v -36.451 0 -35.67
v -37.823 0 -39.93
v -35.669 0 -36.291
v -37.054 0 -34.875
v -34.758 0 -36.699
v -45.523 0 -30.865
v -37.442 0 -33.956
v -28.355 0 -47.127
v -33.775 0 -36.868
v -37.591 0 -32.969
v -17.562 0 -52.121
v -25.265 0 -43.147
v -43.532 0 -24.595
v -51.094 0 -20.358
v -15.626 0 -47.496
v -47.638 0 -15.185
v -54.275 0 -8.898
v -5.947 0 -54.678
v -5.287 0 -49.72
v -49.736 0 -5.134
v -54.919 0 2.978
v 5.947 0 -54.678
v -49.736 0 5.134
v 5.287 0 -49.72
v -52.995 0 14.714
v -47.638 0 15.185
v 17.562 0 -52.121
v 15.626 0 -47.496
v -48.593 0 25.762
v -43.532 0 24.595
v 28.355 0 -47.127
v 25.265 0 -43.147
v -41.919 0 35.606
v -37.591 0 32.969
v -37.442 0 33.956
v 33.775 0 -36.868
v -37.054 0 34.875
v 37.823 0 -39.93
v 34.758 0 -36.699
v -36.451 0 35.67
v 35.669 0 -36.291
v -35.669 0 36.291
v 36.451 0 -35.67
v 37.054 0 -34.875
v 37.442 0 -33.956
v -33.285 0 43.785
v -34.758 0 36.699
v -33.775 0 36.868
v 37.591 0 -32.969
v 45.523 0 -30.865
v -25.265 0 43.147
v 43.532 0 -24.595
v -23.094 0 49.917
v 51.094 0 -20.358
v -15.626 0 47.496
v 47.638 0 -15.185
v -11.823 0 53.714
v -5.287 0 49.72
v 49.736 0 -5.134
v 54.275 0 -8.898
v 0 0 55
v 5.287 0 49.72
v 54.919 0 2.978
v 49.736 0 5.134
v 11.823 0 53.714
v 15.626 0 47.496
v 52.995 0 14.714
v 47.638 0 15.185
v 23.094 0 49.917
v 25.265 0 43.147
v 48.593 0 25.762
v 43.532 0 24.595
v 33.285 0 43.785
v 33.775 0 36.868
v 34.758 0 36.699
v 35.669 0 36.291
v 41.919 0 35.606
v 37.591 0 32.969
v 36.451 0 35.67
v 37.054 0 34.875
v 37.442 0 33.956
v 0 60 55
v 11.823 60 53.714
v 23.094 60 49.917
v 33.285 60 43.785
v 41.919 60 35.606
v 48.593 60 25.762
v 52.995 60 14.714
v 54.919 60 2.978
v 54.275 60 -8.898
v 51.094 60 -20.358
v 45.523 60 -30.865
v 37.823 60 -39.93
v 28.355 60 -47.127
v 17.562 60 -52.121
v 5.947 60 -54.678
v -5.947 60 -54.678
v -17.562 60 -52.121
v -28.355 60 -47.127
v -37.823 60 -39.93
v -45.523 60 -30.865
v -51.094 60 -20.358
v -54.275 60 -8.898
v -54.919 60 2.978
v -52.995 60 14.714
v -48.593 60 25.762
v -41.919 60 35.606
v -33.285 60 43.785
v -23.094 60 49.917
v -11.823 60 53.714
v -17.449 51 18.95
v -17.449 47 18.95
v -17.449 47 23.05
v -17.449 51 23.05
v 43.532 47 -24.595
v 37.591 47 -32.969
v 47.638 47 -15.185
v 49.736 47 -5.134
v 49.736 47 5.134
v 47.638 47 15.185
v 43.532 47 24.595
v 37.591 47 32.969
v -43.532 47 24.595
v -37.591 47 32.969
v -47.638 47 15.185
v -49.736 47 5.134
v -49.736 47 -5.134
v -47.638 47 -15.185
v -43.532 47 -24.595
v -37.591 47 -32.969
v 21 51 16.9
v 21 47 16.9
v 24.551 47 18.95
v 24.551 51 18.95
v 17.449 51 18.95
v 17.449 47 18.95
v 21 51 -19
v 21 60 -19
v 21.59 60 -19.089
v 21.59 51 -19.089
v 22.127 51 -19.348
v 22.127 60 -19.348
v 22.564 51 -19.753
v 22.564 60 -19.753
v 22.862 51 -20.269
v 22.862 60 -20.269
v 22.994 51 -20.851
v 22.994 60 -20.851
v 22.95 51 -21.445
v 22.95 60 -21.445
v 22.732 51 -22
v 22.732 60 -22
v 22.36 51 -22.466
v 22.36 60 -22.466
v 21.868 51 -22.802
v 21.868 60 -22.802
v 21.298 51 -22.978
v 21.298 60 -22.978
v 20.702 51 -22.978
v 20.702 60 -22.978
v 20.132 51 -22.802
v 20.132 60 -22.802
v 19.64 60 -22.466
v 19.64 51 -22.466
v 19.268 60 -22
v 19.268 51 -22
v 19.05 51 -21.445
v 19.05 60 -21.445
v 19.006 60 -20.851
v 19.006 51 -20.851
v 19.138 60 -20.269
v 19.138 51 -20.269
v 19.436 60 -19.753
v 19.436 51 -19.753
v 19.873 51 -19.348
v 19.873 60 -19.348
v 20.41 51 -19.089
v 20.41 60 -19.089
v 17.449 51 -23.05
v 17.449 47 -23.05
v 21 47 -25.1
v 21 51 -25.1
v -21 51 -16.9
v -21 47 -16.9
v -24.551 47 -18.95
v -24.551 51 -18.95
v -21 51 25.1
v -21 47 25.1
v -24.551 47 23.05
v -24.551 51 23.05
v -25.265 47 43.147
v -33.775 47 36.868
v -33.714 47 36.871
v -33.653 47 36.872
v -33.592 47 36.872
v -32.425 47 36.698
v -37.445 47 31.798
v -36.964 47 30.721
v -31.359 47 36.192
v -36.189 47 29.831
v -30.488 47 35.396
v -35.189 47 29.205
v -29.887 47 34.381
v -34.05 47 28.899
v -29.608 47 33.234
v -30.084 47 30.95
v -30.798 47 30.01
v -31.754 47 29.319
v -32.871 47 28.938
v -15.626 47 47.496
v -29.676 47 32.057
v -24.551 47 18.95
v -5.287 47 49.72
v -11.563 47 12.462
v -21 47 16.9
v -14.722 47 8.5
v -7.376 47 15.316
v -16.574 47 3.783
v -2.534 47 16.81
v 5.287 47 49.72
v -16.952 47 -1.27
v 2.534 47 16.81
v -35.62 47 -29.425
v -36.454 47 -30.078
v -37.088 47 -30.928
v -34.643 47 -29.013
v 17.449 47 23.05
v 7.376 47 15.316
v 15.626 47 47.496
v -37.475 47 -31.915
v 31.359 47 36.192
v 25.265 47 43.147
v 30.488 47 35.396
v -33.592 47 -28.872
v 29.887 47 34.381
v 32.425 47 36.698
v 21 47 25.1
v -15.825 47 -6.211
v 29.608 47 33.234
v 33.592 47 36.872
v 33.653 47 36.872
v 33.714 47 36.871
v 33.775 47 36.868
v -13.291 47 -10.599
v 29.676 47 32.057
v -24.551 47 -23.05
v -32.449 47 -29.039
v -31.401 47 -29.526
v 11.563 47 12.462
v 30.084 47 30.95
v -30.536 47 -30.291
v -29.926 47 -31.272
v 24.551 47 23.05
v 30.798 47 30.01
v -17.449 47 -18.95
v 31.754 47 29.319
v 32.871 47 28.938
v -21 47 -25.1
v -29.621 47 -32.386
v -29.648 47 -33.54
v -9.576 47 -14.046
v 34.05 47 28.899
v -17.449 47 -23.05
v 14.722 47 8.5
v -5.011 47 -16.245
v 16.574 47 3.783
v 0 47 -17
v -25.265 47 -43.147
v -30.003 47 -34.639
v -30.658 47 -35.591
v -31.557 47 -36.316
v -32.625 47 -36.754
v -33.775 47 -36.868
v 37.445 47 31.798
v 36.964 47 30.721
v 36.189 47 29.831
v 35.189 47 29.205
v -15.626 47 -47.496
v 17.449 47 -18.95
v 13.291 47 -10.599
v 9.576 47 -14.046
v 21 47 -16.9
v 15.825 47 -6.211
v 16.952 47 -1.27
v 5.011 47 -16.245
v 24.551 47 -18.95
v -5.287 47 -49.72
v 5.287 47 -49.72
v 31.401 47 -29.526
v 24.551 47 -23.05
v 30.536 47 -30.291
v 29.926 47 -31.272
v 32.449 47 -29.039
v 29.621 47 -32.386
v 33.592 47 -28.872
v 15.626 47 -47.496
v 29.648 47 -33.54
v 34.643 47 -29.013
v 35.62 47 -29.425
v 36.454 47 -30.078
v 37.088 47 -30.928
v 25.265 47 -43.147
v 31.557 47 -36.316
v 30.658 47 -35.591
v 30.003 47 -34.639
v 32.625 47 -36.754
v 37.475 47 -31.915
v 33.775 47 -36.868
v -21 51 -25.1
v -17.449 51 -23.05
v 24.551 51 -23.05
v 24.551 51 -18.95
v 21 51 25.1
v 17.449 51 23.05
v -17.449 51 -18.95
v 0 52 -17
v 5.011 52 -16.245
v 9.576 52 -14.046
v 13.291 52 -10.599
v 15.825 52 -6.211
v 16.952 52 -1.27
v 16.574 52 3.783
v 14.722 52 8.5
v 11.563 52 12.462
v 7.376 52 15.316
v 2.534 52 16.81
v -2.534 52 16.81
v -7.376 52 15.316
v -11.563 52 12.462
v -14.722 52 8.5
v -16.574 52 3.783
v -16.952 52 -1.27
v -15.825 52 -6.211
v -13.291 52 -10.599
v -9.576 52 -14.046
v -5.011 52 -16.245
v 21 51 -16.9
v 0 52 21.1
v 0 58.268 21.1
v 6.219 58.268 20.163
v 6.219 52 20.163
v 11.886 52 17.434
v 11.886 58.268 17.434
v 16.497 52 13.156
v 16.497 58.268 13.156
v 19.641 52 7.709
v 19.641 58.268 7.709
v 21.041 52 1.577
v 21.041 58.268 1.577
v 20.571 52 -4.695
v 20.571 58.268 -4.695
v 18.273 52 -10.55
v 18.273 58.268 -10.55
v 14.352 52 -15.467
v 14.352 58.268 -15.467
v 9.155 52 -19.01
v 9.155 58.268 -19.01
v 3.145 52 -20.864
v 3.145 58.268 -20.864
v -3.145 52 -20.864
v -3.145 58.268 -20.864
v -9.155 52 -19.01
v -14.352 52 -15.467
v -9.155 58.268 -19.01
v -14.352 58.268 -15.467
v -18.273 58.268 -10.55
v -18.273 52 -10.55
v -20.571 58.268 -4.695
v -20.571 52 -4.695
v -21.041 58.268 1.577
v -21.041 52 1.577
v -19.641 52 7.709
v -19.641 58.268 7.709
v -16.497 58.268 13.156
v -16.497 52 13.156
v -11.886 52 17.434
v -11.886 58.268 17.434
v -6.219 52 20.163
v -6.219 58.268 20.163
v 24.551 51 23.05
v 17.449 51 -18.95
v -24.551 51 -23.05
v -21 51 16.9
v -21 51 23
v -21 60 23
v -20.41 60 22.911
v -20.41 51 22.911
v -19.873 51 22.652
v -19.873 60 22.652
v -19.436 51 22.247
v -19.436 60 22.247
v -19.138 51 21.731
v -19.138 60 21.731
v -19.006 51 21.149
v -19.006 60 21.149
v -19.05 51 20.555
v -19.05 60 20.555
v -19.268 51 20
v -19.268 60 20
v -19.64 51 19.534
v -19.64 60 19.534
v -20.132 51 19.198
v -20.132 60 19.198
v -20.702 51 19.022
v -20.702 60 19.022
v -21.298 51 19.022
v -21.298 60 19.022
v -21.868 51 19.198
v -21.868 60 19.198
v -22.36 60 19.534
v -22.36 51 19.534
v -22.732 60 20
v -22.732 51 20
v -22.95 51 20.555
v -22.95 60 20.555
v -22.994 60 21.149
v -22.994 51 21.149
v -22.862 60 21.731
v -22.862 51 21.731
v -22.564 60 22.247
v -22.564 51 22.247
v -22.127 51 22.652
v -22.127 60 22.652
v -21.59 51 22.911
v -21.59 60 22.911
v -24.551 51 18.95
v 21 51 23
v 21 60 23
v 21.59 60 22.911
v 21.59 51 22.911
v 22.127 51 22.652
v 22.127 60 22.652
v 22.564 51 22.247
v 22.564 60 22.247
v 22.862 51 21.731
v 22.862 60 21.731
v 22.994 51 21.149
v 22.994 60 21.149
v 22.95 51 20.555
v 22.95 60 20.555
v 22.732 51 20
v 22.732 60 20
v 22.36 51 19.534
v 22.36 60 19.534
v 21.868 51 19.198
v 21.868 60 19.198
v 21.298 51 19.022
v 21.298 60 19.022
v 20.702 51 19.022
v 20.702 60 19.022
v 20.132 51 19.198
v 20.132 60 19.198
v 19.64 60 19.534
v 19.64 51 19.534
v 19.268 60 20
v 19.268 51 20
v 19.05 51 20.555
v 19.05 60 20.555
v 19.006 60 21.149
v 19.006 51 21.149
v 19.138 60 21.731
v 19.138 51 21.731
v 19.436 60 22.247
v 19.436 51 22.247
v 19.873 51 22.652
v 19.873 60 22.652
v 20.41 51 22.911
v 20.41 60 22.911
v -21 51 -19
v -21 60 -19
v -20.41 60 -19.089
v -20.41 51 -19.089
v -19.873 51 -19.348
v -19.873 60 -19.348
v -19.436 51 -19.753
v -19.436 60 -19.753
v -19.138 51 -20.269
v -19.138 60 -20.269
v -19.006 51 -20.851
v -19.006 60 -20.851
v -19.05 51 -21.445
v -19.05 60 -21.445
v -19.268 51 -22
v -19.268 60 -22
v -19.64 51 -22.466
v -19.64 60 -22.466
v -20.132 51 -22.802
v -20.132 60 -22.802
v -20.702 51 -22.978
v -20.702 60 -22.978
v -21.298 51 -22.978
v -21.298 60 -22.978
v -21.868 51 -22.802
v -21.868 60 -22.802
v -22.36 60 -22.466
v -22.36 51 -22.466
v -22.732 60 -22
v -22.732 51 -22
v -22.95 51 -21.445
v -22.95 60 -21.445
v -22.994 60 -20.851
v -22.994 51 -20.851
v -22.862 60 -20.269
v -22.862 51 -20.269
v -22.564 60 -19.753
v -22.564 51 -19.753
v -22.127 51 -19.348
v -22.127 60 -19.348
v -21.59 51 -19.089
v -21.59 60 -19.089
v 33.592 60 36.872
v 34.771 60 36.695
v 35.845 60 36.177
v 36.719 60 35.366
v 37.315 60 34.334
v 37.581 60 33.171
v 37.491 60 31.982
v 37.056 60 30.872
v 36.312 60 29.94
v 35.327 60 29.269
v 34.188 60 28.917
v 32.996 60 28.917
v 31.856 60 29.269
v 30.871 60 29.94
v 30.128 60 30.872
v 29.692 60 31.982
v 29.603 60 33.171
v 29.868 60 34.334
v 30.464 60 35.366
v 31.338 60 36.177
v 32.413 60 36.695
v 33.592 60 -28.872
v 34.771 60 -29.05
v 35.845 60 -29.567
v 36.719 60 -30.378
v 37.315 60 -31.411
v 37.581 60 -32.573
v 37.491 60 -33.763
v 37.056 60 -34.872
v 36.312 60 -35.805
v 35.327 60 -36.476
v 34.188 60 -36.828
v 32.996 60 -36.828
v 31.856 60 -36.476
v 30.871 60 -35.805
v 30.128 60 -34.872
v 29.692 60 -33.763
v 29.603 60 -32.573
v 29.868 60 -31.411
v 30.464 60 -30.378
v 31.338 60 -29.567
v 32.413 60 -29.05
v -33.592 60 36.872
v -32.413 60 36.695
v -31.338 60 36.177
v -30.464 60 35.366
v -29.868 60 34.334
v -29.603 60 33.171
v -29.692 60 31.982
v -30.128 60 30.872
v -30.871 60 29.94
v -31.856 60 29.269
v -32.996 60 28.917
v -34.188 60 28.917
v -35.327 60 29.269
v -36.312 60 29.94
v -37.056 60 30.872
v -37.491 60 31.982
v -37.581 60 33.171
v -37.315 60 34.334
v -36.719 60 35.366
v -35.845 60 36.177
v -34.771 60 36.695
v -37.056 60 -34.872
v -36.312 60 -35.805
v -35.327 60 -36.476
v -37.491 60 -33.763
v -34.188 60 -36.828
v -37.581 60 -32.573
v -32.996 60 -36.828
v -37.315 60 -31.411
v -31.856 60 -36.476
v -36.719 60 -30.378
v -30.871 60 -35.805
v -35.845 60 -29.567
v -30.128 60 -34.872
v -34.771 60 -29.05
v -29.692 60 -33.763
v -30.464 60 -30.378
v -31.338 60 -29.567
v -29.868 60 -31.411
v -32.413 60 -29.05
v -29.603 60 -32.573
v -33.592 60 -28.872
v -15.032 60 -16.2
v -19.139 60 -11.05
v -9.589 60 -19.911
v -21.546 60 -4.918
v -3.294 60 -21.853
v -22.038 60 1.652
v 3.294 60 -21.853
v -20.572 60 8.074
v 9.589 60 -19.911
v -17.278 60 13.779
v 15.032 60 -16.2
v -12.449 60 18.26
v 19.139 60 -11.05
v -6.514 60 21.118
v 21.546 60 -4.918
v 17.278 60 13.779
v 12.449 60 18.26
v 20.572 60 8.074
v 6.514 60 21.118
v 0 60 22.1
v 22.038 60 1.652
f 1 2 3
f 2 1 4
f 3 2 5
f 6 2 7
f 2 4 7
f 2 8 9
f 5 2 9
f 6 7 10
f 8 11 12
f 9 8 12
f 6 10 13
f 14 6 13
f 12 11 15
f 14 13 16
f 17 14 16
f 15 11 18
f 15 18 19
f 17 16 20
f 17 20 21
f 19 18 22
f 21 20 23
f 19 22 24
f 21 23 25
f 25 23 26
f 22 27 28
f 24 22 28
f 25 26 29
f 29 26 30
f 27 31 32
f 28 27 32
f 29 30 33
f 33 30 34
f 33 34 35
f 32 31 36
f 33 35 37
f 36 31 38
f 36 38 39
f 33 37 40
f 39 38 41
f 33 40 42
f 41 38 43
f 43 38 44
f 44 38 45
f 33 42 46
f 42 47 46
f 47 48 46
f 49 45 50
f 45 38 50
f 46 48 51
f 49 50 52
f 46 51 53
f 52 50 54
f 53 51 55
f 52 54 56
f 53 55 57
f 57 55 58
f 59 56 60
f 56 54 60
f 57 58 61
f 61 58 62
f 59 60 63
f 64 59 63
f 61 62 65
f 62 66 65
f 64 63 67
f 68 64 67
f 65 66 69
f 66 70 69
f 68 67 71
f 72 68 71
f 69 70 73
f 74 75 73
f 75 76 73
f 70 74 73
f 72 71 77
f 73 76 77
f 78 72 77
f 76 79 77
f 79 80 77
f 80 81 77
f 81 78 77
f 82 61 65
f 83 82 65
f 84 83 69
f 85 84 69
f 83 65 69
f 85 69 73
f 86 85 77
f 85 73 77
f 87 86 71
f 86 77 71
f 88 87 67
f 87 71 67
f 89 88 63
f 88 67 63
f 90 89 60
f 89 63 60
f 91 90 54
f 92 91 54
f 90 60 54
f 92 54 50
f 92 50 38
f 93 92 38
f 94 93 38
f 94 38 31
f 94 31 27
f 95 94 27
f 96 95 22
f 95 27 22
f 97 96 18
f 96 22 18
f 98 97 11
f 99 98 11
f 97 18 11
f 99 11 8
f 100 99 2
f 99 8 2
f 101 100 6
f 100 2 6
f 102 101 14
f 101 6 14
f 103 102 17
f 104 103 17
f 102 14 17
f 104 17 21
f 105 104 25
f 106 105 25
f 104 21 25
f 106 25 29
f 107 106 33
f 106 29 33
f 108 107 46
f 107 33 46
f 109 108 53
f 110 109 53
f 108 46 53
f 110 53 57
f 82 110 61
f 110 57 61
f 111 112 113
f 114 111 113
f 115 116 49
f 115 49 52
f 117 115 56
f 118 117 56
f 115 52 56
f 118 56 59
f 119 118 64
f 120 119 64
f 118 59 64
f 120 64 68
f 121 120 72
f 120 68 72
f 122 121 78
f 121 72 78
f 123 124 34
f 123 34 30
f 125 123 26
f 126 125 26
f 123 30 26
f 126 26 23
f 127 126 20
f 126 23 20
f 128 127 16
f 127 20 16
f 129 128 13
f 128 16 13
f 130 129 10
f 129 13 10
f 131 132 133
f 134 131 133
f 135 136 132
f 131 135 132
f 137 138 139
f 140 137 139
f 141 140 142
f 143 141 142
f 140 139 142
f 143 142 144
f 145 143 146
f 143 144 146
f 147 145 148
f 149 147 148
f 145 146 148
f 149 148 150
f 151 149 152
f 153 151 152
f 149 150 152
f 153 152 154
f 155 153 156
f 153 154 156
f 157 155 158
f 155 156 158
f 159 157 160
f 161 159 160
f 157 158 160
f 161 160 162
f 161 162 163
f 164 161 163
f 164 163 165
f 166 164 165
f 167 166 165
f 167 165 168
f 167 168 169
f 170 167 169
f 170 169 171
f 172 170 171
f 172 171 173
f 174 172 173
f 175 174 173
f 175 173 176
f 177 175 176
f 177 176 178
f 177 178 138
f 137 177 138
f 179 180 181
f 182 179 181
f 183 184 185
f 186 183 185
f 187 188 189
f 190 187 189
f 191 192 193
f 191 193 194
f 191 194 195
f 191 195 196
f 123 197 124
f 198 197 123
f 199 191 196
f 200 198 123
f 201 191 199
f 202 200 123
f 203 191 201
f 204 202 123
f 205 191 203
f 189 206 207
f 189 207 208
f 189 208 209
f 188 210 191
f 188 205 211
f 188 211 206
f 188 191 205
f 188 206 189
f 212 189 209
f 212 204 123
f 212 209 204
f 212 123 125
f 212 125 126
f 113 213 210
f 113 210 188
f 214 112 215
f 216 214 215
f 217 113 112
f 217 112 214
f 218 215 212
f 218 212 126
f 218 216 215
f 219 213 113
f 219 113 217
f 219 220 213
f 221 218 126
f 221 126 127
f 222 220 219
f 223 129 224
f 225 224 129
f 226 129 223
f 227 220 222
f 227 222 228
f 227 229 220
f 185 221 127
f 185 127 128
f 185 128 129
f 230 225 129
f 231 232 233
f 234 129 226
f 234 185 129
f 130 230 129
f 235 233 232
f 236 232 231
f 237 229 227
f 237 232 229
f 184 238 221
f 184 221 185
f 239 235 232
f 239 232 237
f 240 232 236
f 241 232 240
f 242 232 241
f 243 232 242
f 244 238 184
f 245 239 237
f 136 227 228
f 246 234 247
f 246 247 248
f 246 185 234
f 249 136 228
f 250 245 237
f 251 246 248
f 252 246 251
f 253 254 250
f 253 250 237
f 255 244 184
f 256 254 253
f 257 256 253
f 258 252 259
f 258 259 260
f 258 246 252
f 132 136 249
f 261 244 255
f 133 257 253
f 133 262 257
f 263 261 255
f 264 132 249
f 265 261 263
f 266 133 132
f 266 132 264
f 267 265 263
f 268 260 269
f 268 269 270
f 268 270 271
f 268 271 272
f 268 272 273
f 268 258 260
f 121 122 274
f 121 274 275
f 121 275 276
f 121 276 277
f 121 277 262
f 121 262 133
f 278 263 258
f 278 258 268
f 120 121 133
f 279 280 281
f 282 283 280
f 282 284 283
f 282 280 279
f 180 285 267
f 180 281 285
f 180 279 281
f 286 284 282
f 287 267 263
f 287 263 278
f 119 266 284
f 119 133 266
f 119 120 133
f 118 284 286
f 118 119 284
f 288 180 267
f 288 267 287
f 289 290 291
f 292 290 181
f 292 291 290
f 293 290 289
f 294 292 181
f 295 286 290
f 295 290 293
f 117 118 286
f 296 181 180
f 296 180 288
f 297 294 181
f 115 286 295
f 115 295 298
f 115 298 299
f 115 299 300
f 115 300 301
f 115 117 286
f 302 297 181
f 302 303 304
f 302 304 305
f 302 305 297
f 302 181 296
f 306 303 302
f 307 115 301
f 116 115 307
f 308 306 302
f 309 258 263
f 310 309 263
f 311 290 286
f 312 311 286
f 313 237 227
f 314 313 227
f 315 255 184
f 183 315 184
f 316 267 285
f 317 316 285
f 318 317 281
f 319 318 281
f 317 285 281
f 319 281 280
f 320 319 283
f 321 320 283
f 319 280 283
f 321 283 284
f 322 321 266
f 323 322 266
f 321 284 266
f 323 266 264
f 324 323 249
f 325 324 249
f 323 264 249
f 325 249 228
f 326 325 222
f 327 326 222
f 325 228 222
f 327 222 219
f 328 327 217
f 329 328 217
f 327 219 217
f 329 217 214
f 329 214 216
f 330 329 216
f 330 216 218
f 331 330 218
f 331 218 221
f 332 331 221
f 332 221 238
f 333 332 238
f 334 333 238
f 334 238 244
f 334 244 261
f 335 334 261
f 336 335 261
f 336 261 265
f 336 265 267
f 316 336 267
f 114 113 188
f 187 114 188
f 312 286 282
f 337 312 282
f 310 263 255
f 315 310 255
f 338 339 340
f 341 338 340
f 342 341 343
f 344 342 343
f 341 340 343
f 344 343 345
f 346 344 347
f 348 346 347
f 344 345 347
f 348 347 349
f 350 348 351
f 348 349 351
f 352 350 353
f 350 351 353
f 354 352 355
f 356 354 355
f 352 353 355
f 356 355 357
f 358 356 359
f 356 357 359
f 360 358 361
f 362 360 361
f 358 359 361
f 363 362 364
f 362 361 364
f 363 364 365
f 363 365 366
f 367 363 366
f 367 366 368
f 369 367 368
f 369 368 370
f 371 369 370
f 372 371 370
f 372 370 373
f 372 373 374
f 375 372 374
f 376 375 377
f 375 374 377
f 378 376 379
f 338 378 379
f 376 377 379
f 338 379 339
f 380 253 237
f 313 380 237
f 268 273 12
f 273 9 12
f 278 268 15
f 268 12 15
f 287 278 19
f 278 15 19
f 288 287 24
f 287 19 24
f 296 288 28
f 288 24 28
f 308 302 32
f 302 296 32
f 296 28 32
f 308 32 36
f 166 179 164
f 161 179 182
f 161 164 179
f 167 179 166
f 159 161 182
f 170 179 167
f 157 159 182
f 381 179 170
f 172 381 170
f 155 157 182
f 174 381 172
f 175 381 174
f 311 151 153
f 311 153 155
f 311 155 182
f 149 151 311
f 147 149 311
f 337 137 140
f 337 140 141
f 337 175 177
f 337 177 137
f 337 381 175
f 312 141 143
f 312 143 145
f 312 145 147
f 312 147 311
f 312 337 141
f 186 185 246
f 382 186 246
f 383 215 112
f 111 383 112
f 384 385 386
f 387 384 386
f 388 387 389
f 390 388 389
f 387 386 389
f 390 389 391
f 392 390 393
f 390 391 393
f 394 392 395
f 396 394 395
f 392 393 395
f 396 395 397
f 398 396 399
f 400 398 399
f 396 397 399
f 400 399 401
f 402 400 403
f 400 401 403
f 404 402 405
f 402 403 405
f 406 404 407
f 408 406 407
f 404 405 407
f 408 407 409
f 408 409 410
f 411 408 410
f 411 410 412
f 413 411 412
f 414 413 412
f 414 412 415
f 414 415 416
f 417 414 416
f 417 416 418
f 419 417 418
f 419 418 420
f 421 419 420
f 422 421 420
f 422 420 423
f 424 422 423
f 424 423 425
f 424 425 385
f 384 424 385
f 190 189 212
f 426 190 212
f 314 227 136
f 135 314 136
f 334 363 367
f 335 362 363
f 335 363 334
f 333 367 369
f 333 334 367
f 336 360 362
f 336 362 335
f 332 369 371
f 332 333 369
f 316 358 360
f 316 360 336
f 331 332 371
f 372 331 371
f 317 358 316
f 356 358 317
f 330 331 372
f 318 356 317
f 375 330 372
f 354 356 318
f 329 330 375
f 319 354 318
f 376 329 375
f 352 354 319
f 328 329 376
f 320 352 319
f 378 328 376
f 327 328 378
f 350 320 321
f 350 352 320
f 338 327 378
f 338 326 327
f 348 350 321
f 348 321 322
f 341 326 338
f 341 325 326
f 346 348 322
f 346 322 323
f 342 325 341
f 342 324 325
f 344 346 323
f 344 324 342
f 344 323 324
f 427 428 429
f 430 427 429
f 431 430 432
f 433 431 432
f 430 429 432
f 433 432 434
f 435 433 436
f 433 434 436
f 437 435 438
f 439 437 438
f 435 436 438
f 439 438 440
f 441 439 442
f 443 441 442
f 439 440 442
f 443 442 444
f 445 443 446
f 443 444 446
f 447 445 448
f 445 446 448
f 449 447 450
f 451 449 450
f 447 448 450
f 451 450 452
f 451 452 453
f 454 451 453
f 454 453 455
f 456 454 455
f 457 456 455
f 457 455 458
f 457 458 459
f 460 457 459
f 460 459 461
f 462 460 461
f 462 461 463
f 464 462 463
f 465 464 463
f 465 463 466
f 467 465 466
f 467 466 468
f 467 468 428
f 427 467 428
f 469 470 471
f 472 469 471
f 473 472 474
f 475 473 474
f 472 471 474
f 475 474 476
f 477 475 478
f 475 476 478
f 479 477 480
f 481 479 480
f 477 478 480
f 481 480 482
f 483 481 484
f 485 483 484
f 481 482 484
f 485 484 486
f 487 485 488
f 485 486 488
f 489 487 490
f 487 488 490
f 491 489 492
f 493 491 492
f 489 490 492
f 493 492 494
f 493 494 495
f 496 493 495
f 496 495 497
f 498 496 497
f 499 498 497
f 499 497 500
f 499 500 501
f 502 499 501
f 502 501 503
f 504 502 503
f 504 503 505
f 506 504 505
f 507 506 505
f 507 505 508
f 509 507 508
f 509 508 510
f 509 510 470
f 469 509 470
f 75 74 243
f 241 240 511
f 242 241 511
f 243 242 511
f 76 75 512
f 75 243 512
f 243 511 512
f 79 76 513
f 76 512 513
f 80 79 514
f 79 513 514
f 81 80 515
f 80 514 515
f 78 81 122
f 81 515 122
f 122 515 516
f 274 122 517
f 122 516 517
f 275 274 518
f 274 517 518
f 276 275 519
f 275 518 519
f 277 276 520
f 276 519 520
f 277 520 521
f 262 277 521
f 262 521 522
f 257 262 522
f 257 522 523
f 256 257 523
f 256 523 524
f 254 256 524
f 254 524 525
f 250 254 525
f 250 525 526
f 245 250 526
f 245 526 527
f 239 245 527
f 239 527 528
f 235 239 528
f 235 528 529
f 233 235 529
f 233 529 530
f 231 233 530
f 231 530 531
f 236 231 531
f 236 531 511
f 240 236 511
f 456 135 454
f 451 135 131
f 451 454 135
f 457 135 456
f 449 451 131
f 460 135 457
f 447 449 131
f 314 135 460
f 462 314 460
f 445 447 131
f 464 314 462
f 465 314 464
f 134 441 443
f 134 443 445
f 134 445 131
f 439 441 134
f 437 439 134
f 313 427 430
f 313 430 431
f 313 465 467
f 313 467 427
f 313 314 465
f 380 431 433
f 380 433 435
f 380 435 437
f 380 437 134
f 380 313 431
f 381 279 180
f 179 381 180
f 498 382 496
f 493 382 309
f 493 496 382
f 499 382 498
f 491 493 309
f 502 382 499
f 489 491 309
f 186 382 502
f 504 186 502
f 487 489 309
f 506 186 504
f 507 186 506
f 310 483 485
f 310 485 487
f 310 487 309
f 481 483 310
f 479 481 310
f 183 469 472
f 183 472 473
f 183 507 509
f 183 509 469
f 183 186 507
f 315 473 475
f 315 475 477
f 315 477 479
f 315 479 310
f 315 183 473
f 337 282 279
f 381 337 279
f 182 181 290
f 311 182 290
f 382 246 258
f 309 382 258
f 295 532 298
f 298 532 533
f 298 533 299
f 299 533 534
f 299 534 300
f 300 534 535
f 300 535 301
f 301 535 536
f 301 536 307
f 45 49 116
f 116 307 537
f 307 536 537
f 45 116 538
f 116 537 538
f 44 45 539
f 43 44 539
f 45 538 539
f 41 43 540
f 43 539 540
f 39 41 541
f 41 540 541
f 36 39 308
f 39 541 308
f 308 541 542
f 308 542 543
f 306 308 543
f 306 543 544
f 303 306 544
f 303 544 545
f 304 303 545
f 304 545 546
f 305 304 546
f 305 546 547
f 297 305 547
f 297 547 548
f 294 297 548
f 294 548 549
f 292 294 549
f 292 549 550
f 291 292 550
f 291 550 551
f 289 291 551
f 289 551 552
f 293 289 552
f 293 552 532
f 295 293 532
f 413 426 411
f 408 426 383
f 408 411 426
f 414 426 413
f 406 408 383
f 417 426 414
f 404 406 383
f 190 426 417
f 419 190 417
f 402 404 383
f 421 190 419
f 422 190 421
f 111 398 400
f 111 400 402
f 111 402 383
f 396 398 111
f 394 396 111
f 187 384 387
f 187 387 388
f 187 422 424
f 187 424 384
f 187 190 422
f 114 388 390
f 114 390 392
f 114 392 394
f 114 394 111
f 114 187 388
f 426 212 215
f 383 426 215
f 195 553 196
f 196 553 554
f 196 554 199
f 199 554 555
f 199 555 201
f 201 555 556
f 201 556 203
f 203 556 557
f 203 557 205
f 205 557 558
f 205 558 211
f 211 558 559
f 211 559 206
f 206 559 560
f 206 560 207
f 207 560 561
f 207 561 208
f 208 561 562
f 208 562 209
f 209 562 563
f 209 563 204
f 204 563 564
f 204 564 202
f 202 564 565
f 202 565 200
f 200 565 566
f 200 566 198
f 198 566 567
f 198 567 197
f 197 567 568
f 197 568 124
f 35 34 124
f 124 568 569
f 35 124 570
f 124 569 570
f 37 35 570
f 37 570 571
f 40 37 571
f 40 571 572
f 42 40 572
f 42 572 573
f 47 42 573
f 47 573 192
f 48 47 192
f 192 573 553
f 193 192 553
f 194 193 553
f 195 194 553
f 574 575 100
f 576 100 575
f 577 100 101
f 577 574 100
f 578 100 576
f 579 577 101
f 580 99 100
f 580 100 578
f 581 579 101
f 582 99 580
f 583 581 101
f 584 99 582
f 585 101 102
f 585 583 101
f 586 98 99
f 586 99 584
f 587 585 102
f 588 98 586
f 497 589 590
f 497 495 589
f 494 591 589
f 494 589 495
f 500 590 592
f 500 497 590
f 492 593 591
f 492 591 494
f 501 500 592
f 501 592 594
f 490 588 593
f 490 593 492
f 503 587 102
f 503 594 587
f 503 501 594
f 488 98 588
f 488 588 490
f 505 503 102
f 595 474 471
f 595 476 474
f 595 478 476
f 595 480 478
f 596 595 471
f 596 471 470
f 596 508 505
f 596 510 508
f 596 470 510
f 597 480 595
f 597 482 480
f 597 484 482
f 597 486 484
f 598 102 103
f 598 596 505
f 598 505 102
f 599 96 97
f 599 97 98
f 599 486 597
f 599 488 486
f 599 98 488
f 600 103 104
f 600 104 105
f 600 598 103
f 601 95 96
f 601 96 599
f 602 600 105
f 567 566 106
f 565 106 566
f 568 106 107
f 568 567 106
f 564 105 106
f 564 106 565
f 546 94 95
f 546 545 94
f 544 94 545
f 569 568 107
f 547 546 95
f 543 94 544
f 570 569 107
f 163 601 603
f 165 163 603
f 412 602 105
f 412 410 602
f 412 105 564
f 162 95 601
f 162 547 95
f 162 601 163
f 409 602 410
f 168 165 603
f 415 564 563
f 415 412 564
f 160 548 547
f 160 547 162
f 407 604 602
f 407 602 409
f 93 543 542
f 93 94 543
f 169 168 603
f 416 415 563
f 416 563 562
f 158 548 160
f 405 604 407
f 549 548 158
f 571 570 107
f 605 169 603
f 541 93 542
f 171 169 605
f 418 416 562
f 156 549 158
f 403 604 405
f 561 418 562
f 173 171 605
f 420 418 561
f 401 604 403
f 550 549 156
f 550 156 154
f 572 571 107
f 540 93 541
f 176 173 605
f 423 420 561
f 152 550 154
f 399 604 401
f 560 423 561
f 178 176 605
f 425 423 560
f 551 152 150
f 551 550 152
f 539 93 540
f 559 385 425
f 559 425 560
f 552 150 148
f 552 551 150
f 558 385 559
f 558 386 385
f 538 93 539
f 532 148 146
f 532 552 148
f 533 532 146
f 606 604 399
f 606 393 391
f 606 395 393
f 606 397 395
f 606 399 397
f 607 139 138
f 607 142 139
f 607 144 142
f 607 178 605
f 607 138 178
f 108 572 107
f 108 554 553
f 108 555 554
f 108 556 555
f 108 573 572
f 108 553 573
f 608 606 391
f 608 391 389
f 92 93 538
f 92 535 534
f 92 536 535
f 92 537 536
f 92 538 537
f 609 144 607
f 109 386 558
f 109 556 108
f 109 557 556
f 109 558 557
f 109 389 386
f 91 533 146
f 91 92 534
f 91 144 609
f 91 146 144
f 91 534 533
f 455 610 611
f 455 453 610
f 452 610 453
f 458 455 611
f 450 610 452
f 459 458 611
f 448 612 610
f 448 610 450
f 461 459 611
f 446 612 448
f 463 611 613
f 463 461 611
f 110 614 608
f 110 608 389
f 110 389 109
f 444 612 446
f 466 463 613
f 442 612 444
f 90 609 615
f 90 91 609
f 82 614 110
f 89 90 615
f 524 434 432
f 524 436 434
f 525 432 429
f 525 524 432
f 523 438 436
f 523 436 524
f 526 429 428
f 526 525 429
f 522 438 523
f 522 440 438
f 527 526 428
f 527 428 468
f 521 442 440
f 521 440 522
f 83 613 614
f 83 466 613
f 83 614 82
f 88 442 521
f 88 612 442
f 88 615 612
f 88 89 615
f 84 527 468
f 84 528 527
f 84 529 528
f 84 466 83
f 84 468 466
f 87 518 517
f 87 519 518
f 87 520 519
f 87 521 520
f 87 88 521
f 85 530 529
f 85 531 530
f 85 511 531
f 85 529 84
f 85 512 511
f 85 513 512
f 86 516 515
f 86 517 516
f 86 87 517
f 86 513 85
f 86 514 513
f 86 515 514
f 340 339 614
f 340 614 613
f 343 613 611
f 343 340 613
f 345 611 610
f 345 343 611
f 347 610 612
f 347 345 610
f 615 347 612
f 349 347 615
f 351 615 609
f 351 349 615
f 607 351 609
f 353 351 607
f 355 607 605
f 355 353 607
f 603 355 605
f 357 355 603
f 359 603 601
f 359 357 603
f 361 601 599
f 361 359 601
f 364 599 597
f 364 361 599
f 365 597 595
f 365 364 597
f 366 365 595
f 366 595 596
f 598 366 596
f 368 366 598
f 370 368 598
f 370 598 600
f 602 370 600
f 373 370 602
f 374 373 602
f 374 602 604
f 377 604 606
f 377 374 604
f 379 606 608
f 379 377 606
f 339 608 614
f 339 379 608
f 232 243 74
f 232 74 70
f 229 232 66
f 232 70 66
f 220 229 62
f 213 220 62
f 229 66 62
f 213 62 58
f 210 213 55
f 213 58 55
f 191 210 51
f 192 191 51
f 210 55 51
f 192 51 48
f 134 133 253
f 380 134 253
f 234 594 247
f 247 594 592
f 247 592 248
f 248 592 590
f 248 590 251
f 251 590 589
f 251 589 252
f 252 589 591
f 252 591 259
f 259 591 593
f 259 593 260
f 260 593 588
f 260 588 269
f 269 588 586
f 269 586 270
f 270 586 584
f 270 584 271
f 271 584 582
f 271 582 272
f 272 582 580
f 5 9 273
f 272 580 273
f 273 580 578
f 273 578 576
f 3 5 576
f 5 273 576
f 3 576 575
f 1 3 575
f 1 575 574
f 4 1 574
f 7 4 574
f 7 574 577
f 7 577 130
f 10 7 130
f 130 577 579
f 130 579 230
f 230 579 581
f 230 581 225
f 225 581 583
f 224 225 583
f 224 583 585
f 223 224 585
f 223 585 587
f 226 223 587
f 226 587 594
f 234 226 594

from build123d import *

# Parameters (mm, degrees)
SKETCH_1_R          = 55
EXTRUDE_1_DEPTH     = 60
SKETCH_2_R          = 50
CUT_EXTRUDE_1_DEPTH = 47
SKETCH_3_R          = 17
CUT_EXTRUDE_2_DEPTH = 14
SKETCH_4_R          = 4
CUT_EXTRUDE_3_DEPTH = 61
SKETCH1_R           = 21.1
CUT_EXTRUDE1_DEPTH  = 8
CHAMFER1_SIZE       = 1
CHAMFER1_SIZE2      = 1.732050808
SKETCH2_R           = 2
CUT_EXTRUDE2_DEPTH  = 61
CUT_EXTRUDE3_DEPTH  = 4


with BuildPart() as part:
    # Эскиз1 → Бобышка-Вытянуть1 (new body)
    with BuildSketch(Plane(origin=(0, 0, 0), x_dir=(1, 0, 0), z_dir=(0, 1, 0))):
        with Locations(Location((0, 0, 0), (0, 0, 270))):  # turned: the seam where the file's is
            Circle(SKETCH_1_R)
    extrude(amount=EXTRUDE_1_DEPTH)

    # Эскиз2 → Вырез-Вытянуть1 (cut)
    with BuildSketch(Plane.XZ):
        with Locations(Location((0, 0, 0), (0, 0, 270))):  # turned: the seam where the file's is
            Circle(SKETCH_2_R)
    extrude(amount=-CUT_EXTRUDE_1_DEPTH, mode=Mode.SUBTRACT)

    # Эскиз3 → Вырез-Вытянуть2 (cut, through all)
    with BuildSketch(Plane.XZ.offset(-47)):
        with Locations(Location((0, 0, 0), (0, 0, 270))):  # turned: the seam where the file's is
            Circle(SKETCH_3_R)
    extrude(amount=-CUT_EXTRUDE_2_DEPTH, mode=Mode.SUBTRACT)

    # Эскиз4 → Вырез-Вытянуть3 (cut, through all)
    with BuildSketch(Plane(origin=(0, 60, 0), x_dir=(1, 0, 0), z_dir=(0, 1, 0))):
        with Locations(Location((33.591727056, -32.872418125, 0), (0, 0, 270))):  # turned: the seam where the file's is
            Circle(SKETCH_4_R)
        with Locations(Location((-33.591727056, -32.872418125, 0), (0, 0, 270))):  # turned: the seam where the file's is
            Circle(SKETCH_4_R)
        with Locations(Location((-33.591727056, 32.872418125, 0), (0, 0, 270))):  # turned: the seam where the file's is
            Circle(SKETCH_4_R)
        with Locations(Location((33.591727056, 32.872418125, 0), (0, 0, 270))):  # turned: the seam where the file's is
            Circle(SKETCH_4_R)
    extrude(amount=-CUT_EXTRUDE_3_DEPTH, mode=Mode.SUBTRACT)

    # Sketch1 → Cut-Extrude1 (cut)
    with BuildSketch(Plane(origin=(0, 60, 0), x_dir=(1, 0, 0), z_dir=(0, 1, 0))):
        with Locations(Location((0, 0, 0), (0, 0, 270))):  # turned: the seam where the file's is
            Circle(SKETCH1_R)
    extrude(amount=-CUT_EXTRUDE1_DEPTH, mode=Mode.SUBTRACT)

    # Chamfer1
    chamfer1_edges = [part.edges().sort_by_distance(p)[0] for p in [
        (0, 60, -21.1),
    ]]
    chamfer1_side = [part.faces().sort_by_distance(p)[0] for p in [
        (0, 60, -53.444365081),
    ]]
    chamfer(chamfer1_edges, length=CHAMFER1_SIZE, length2=CHAMFER1_SIZE2, reference=chamfer1_side[0])

    # Sketch2 → Cut-Extrude2 (cut, through all)
    with BuildSketch(Plane(origin=(0, 60, 0), x_dir=(1, 0, 0), z_dir=(0, 1, 0))):
        with Locations(Location((21, 21, 0), (0, 0, 270))):  # turned: the seam where the file's is
            Circle(SKETCH2_R)
        with Locations(Location((-21, 21, 0), (0, 0, 270))):  # turned: the seam where the file's is
            Circle(SKETCH2_R)
        with Locations(Location((21, -21, 0), (0, 0, 270))):  # turned: the seam where the file's is
            Circle(SKETCH2_R)
        with Locations(Location((-21, -21, 0), (0, 0, 270))):  # turned: the seam where the file's is
            Circle(SKETCH2_R)
    extrude(amount=-CUT_EXTRUDE2_DEPTH, mode=Mode.SUBTRACT)

    # Sketch3 → Cut-Extrude3 (cut)
    with BuildSketch(Plane.XZ.offset(-47)):
        Polygon((-21, -16.9), (-24.550704156, -18.95), (-24.550704156, -23.05), (-21, -25.1), (-17.449295844, -23.05), (-17.449295844, -18.95), align=None)
        Polygon((-21, 25.1), (-24.550704156, 23.05), (-24.550704156, 18.95), (-21, 16.9), (-17.449295844, 18.95), (-17.449295844, 23.05), align=None)
        Polygon((24.550704156, 23.05), (21, 25.1), (17.449295844, 23.05), (17.449295844, 18.95), (21, 16.9), (24.550704156, 18.95), align=None)
        Polygon((24.550704156, -18.95), (21, -16.9), (17.449295844, -18.95), (17.449295844, -23.05), (21, -25.1), (24.550704156, -23.05), align=None)
    extrude(amount=-CUT_EXTRUDE3_DEPTH, mode=Mode.SUBTRACT)


solid = part.part
